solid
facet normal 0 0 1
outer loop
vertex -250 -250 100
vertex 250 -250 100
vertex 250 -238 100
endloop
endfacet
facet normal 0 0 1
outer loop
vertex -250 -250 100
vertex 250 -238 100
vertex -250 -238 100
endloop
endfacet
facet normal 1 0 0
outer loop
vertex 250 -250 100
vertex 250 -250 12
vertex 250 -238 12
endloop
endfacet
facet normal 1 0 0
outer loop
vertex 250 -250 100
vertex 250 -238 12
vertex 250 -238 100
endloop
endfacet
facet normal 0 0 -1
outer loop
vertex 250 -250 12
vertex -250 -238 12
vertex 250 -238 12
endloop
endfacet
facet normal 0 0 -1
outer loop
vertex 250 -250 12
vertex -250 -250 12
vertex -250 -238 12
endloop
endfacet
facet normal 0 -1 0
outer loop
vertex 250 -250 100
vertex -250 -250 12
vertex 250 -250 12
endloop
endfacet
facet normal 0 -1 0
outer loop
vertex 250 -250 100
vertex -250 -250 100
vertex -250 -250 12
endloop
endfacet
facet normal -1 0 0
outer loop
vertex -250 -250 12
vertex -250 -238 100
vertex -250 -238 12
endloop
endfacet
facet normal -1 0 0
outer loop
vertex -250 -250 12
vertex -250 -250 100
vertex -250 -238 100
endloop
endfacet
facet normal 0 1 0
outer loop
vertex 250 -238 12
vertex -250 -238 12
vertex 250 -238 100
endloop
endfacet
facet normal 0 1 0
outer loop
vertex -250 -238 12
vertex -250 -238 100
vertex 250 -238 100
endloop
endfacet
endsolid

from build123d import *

# Parameters (mm, degrees)
F0_W      = 500
F0_H      = 500
F1_DEPTH  = 12
F2_W      = 500
F2_H      = 50
F3_DEPTH  = 6
F6_DEPTH  = 6
F14_DEPTH = 6
F15_R     = 19.99999
F19_DEPTH = 6
F22_DEPTH = 12
F25_DEPTH = 6
F27_W     = 12
F27_H     = 320
F28_DEPTH = 44
F31_W     = 196
F31_H     = 12
F32_DEPTH = 44
F37_DEPTH = 3
F43_DEPTH = 12


# Not quite as in the source:
# - a fillet or chamfer is up to 0.001 mm smaller than in the source, because OpenCascade refuses the exact size


with BuildPart() as f1:
    # F0 (on Top) → F1 (new body)
    with BuildSketch(Plane.XY):
        Rectangle(F0_W, F0_H)
    extrude(amount=F1_DEPTH)


with BuildPart() as f3:
    # F2 (on Right) → F3 (new body, symmetric)
    with BuildSketch(Plane.YZ):
        Rectangle(F2_W, F2_H)
    extrude(amount=F3_DEPTH, both=True)


with BuildPart() as f3_1:
    # F4: moved
    add(f3.part.moved(Location((0, 0, -25))))


with BuildPart() as f6:
    # F5 (on Front) → F6 (new body, symmetric)
    with BuildSketch(Plane.XZ):
        Polygon((-250, -25), (250, -25), (250, 25), (6, 25), (6, 0), (-6, 0), (-6, 25), (-250, 25), align=None)
    extrude(amount=F6_DEPTH, both=True)


with BuildPart() as f6_1:
    # F7: moved
    add(f6.part.moved(Location((0, 80, -25))))


with BuildPart() as f8_1:
    # F8: copy of F6
    add(f6_1.part)


with BuildPart() as f3_2:
    add(f3_1.part)

    # F10: cut F6
    add(f6_1.part, mode=Mode.SUBTRACT)


with BuildPart() as f11_1:
    # F11: copy of F6
    add(f6_1.part.moved(Location((0, 164, 0))))


with BuildPart() as f3_3:
    add(f3_2.part)

    # F12: cut F11_1
    add(f11_1.part, mode=Mode.SUBTRACT)


with BuildPart() as f14:
    # F13 (on Right) → F14 (new body, symmetric)
    with BuildSketch(Plane.YZ):
        Polygon((250, -50), (250, 0), (250, 452), (70, 452), (-110, 452), (-250, 100), (-250, -50), align=None)
        Polygon((0, 412), (70, 412), (140, 412), (140, 372), (0, 372), align=None, mode=Mode.SUBTRACT)
    extrude(amount=F14_DEPTH, both=True)

    # F15 (radius 20 in the source; OpenCascade refuses exactly that, so slightly less here)
    f15_edges = [f14.edges().sort_by_distance(p)[0] for p in [
        (0, 140, 372),
        (0, 140, 412),
        (0, 0, 412),
        (0, 0, 372),
    ]]
    fillet(f15_edges, radius=F15_R)


with BuildPart() as f14_1:
    # F16: moved
    add(f14.part.moved(Location((-256, 0, 0))))


with BuildPart() as f17_1:
    # F17: copy of F14
    add(f14_1.part.moved(Location((512, 0, 0))))


with BuildPart() as f19:
    # F18 (on Front) → F19 (new body, symmetric)
    with BuildSketch(Plane.XZ):
        Polygon((-262, 452), (-262, 0), (-262, -50), (262, -50), (262, 452), align=None)
    extrude(amount=F19_DEPTH, both=True)


with BuildPart() as f19_1:
    # F20: moved
    add(f19.part.moved(Location((0, 256, 0))))


with BuildPart() as f22:
    # F21 (on face) → F22 (new body)
    with BuildSketch(Plane.XY.offset(12)):
        Polygon((262, 262), (0, 262), (-262, 262), (-262, -110), (262, -110), align=None)
    extrude(amount=F22_DEPTH)


with BuildPart() as f22_1:
    # F23: moved
    add(f22.part.moved(Location((0, 0, 440))))


with BuildPart() as f25:
    # F24 (on Front) → F25 (new body, symmetric)
    with BuildSketch(Plane.XZ):
        Polygon((-250, 12), (0, 12), (250, 12), (250, 100), (-250, 100), align=None)
    extrude(amount=F25_DEPTH, both=True)


with BuildPart() as f25_1:
    # F26: moved
    add(f25.part.moved(Location((0, -244, 0))))


with BuildPart() as f28:
    # F27 (on Top) → F28 (new body)
    with BuildSketch(Plane.XY):
        with Locations((-24, -90)):
            Rectangle(F27_W, F27_H)
    extrude(amount=F28_DEPTH)


with BuildPart() as f28_1:
    # F29: moved
    add(f28.part.moved(Location((0, 0, -48))))


with BuildPart() as f30_1:
    # F30: copy of F28
    add(f28_1.part.moved(Location((-208, 0, 0))))


with BuildPart() as f32:
    # F31 (on Top) → F32 (new body)
    with BuildSketch(Plane.XY):
        with Locations((-128, -244)):
            Rectangle(F31_W, F31_H)
    extrude(amount=-F32_DEPTH)


with BuildPart() as f32_1:
    # F33: moved
    add(f32.part.moved(Location((0, 0, -4))))


with BuildPart() as f34_1:
    # F34: copy of F32
    add(f32_1.part.moved(Location((0, 308, 0))))


with BuildPart() as f35_1:
    # F35: copy of F32
    add(f32_1.part.moved(Location((256, 0, 0))))


with BuildPart() as f35_2:
    # F35: copy of F30_1
    add(f30_1.part.moved(Location((256, 0, 0))))


with BuildPart() as f35_3:
    # F35: copy of F28
    add(f28_1.part.moved(Location((256, 0, 0))))


with BuildPart() as f35_4:
    # F35: copy of F34_1
    add(f34_1.part.moved(Location((256, 0, 0))))


with BuildPart() as f37:
    # F36 (on Top) → F37 (new body)
    with BuildSketch(Plane.XY):
        Polygon((-24, -244), (-24, 0), (-24, 64), (-232, 64), (-232, -244), align=None)
    extrude(amount=F37_DEPTH)


with BuildPart() as f37_1:
    # F38: moved
    add(f37.part.moved(Location((0, 0, -44))))


with BuildPart() as f39_1:
    # F39: copy of F37
    add(f37_1.part.moved(Location((256, 0, 0))))


with BuildPart() as f30_1_1:
    add(f30_1.part)

    # F40: cut F37
    add(f37_1.part, mode=Mode.SUBTRACT)


with BuildPart() as f32_2:
    add(f32_1.part)

    # F40: cut F37
    add(f37_1.part, mode=Mode.SUBTRACT)


with BuildPart() as f28_2:
    add(f28_1.part)

    # F40: cut F37
    add(f37_1.part, mode=Mode.SUBTRACT)


with BuildPart() as f34_1_1:
    add(f34_1.part)

    # F40: cut F37
    add(f37_1.part, mode=Mode.SUBTRACT)


with BuildPart() as f35_1_1:
    add(f35_1.part)

    # F41: cut F39_1
    add(f39_1.part, mode=Mode.SUBTRACT)


with BuildPart() as f35_3_1:
    add(f35_3.part)

    # F41: cut F39_1
    add(f39_1.part, mode=Mode.SUBTRACT)


with BuildPart() as f35_4_1:
    add(f35_4.part)

    # F41: cut F39_1
    add(f39_1.part, mode=Mode.SUBTRACT)


with BuildPart() as f35_2_1:
    add(f35_2.part)

    # F41: cut F39_1
    add(f39_1.part, mode=Mode.SUBTRACT)


with BuildPart() as f43:
    # F42 (on Front) → F43 (new body)
    with BuildSketch(Plane.XZ):
        Polygon((0, 12), (0, 0), (0, -50), (262, -50), (262, 12), align=None)
    extrude(amount=F43_DEPTH)


with BuildPart() as f43_1:
    # F44: moved
    add(f43.part.moved(Location((0, -250, 0))))


with BuildPart() as f45_1:
    # F45: copy of F43
    add(f43_1.part.moved(Location((-262, 0, 0))))


solid = f25_1.part
